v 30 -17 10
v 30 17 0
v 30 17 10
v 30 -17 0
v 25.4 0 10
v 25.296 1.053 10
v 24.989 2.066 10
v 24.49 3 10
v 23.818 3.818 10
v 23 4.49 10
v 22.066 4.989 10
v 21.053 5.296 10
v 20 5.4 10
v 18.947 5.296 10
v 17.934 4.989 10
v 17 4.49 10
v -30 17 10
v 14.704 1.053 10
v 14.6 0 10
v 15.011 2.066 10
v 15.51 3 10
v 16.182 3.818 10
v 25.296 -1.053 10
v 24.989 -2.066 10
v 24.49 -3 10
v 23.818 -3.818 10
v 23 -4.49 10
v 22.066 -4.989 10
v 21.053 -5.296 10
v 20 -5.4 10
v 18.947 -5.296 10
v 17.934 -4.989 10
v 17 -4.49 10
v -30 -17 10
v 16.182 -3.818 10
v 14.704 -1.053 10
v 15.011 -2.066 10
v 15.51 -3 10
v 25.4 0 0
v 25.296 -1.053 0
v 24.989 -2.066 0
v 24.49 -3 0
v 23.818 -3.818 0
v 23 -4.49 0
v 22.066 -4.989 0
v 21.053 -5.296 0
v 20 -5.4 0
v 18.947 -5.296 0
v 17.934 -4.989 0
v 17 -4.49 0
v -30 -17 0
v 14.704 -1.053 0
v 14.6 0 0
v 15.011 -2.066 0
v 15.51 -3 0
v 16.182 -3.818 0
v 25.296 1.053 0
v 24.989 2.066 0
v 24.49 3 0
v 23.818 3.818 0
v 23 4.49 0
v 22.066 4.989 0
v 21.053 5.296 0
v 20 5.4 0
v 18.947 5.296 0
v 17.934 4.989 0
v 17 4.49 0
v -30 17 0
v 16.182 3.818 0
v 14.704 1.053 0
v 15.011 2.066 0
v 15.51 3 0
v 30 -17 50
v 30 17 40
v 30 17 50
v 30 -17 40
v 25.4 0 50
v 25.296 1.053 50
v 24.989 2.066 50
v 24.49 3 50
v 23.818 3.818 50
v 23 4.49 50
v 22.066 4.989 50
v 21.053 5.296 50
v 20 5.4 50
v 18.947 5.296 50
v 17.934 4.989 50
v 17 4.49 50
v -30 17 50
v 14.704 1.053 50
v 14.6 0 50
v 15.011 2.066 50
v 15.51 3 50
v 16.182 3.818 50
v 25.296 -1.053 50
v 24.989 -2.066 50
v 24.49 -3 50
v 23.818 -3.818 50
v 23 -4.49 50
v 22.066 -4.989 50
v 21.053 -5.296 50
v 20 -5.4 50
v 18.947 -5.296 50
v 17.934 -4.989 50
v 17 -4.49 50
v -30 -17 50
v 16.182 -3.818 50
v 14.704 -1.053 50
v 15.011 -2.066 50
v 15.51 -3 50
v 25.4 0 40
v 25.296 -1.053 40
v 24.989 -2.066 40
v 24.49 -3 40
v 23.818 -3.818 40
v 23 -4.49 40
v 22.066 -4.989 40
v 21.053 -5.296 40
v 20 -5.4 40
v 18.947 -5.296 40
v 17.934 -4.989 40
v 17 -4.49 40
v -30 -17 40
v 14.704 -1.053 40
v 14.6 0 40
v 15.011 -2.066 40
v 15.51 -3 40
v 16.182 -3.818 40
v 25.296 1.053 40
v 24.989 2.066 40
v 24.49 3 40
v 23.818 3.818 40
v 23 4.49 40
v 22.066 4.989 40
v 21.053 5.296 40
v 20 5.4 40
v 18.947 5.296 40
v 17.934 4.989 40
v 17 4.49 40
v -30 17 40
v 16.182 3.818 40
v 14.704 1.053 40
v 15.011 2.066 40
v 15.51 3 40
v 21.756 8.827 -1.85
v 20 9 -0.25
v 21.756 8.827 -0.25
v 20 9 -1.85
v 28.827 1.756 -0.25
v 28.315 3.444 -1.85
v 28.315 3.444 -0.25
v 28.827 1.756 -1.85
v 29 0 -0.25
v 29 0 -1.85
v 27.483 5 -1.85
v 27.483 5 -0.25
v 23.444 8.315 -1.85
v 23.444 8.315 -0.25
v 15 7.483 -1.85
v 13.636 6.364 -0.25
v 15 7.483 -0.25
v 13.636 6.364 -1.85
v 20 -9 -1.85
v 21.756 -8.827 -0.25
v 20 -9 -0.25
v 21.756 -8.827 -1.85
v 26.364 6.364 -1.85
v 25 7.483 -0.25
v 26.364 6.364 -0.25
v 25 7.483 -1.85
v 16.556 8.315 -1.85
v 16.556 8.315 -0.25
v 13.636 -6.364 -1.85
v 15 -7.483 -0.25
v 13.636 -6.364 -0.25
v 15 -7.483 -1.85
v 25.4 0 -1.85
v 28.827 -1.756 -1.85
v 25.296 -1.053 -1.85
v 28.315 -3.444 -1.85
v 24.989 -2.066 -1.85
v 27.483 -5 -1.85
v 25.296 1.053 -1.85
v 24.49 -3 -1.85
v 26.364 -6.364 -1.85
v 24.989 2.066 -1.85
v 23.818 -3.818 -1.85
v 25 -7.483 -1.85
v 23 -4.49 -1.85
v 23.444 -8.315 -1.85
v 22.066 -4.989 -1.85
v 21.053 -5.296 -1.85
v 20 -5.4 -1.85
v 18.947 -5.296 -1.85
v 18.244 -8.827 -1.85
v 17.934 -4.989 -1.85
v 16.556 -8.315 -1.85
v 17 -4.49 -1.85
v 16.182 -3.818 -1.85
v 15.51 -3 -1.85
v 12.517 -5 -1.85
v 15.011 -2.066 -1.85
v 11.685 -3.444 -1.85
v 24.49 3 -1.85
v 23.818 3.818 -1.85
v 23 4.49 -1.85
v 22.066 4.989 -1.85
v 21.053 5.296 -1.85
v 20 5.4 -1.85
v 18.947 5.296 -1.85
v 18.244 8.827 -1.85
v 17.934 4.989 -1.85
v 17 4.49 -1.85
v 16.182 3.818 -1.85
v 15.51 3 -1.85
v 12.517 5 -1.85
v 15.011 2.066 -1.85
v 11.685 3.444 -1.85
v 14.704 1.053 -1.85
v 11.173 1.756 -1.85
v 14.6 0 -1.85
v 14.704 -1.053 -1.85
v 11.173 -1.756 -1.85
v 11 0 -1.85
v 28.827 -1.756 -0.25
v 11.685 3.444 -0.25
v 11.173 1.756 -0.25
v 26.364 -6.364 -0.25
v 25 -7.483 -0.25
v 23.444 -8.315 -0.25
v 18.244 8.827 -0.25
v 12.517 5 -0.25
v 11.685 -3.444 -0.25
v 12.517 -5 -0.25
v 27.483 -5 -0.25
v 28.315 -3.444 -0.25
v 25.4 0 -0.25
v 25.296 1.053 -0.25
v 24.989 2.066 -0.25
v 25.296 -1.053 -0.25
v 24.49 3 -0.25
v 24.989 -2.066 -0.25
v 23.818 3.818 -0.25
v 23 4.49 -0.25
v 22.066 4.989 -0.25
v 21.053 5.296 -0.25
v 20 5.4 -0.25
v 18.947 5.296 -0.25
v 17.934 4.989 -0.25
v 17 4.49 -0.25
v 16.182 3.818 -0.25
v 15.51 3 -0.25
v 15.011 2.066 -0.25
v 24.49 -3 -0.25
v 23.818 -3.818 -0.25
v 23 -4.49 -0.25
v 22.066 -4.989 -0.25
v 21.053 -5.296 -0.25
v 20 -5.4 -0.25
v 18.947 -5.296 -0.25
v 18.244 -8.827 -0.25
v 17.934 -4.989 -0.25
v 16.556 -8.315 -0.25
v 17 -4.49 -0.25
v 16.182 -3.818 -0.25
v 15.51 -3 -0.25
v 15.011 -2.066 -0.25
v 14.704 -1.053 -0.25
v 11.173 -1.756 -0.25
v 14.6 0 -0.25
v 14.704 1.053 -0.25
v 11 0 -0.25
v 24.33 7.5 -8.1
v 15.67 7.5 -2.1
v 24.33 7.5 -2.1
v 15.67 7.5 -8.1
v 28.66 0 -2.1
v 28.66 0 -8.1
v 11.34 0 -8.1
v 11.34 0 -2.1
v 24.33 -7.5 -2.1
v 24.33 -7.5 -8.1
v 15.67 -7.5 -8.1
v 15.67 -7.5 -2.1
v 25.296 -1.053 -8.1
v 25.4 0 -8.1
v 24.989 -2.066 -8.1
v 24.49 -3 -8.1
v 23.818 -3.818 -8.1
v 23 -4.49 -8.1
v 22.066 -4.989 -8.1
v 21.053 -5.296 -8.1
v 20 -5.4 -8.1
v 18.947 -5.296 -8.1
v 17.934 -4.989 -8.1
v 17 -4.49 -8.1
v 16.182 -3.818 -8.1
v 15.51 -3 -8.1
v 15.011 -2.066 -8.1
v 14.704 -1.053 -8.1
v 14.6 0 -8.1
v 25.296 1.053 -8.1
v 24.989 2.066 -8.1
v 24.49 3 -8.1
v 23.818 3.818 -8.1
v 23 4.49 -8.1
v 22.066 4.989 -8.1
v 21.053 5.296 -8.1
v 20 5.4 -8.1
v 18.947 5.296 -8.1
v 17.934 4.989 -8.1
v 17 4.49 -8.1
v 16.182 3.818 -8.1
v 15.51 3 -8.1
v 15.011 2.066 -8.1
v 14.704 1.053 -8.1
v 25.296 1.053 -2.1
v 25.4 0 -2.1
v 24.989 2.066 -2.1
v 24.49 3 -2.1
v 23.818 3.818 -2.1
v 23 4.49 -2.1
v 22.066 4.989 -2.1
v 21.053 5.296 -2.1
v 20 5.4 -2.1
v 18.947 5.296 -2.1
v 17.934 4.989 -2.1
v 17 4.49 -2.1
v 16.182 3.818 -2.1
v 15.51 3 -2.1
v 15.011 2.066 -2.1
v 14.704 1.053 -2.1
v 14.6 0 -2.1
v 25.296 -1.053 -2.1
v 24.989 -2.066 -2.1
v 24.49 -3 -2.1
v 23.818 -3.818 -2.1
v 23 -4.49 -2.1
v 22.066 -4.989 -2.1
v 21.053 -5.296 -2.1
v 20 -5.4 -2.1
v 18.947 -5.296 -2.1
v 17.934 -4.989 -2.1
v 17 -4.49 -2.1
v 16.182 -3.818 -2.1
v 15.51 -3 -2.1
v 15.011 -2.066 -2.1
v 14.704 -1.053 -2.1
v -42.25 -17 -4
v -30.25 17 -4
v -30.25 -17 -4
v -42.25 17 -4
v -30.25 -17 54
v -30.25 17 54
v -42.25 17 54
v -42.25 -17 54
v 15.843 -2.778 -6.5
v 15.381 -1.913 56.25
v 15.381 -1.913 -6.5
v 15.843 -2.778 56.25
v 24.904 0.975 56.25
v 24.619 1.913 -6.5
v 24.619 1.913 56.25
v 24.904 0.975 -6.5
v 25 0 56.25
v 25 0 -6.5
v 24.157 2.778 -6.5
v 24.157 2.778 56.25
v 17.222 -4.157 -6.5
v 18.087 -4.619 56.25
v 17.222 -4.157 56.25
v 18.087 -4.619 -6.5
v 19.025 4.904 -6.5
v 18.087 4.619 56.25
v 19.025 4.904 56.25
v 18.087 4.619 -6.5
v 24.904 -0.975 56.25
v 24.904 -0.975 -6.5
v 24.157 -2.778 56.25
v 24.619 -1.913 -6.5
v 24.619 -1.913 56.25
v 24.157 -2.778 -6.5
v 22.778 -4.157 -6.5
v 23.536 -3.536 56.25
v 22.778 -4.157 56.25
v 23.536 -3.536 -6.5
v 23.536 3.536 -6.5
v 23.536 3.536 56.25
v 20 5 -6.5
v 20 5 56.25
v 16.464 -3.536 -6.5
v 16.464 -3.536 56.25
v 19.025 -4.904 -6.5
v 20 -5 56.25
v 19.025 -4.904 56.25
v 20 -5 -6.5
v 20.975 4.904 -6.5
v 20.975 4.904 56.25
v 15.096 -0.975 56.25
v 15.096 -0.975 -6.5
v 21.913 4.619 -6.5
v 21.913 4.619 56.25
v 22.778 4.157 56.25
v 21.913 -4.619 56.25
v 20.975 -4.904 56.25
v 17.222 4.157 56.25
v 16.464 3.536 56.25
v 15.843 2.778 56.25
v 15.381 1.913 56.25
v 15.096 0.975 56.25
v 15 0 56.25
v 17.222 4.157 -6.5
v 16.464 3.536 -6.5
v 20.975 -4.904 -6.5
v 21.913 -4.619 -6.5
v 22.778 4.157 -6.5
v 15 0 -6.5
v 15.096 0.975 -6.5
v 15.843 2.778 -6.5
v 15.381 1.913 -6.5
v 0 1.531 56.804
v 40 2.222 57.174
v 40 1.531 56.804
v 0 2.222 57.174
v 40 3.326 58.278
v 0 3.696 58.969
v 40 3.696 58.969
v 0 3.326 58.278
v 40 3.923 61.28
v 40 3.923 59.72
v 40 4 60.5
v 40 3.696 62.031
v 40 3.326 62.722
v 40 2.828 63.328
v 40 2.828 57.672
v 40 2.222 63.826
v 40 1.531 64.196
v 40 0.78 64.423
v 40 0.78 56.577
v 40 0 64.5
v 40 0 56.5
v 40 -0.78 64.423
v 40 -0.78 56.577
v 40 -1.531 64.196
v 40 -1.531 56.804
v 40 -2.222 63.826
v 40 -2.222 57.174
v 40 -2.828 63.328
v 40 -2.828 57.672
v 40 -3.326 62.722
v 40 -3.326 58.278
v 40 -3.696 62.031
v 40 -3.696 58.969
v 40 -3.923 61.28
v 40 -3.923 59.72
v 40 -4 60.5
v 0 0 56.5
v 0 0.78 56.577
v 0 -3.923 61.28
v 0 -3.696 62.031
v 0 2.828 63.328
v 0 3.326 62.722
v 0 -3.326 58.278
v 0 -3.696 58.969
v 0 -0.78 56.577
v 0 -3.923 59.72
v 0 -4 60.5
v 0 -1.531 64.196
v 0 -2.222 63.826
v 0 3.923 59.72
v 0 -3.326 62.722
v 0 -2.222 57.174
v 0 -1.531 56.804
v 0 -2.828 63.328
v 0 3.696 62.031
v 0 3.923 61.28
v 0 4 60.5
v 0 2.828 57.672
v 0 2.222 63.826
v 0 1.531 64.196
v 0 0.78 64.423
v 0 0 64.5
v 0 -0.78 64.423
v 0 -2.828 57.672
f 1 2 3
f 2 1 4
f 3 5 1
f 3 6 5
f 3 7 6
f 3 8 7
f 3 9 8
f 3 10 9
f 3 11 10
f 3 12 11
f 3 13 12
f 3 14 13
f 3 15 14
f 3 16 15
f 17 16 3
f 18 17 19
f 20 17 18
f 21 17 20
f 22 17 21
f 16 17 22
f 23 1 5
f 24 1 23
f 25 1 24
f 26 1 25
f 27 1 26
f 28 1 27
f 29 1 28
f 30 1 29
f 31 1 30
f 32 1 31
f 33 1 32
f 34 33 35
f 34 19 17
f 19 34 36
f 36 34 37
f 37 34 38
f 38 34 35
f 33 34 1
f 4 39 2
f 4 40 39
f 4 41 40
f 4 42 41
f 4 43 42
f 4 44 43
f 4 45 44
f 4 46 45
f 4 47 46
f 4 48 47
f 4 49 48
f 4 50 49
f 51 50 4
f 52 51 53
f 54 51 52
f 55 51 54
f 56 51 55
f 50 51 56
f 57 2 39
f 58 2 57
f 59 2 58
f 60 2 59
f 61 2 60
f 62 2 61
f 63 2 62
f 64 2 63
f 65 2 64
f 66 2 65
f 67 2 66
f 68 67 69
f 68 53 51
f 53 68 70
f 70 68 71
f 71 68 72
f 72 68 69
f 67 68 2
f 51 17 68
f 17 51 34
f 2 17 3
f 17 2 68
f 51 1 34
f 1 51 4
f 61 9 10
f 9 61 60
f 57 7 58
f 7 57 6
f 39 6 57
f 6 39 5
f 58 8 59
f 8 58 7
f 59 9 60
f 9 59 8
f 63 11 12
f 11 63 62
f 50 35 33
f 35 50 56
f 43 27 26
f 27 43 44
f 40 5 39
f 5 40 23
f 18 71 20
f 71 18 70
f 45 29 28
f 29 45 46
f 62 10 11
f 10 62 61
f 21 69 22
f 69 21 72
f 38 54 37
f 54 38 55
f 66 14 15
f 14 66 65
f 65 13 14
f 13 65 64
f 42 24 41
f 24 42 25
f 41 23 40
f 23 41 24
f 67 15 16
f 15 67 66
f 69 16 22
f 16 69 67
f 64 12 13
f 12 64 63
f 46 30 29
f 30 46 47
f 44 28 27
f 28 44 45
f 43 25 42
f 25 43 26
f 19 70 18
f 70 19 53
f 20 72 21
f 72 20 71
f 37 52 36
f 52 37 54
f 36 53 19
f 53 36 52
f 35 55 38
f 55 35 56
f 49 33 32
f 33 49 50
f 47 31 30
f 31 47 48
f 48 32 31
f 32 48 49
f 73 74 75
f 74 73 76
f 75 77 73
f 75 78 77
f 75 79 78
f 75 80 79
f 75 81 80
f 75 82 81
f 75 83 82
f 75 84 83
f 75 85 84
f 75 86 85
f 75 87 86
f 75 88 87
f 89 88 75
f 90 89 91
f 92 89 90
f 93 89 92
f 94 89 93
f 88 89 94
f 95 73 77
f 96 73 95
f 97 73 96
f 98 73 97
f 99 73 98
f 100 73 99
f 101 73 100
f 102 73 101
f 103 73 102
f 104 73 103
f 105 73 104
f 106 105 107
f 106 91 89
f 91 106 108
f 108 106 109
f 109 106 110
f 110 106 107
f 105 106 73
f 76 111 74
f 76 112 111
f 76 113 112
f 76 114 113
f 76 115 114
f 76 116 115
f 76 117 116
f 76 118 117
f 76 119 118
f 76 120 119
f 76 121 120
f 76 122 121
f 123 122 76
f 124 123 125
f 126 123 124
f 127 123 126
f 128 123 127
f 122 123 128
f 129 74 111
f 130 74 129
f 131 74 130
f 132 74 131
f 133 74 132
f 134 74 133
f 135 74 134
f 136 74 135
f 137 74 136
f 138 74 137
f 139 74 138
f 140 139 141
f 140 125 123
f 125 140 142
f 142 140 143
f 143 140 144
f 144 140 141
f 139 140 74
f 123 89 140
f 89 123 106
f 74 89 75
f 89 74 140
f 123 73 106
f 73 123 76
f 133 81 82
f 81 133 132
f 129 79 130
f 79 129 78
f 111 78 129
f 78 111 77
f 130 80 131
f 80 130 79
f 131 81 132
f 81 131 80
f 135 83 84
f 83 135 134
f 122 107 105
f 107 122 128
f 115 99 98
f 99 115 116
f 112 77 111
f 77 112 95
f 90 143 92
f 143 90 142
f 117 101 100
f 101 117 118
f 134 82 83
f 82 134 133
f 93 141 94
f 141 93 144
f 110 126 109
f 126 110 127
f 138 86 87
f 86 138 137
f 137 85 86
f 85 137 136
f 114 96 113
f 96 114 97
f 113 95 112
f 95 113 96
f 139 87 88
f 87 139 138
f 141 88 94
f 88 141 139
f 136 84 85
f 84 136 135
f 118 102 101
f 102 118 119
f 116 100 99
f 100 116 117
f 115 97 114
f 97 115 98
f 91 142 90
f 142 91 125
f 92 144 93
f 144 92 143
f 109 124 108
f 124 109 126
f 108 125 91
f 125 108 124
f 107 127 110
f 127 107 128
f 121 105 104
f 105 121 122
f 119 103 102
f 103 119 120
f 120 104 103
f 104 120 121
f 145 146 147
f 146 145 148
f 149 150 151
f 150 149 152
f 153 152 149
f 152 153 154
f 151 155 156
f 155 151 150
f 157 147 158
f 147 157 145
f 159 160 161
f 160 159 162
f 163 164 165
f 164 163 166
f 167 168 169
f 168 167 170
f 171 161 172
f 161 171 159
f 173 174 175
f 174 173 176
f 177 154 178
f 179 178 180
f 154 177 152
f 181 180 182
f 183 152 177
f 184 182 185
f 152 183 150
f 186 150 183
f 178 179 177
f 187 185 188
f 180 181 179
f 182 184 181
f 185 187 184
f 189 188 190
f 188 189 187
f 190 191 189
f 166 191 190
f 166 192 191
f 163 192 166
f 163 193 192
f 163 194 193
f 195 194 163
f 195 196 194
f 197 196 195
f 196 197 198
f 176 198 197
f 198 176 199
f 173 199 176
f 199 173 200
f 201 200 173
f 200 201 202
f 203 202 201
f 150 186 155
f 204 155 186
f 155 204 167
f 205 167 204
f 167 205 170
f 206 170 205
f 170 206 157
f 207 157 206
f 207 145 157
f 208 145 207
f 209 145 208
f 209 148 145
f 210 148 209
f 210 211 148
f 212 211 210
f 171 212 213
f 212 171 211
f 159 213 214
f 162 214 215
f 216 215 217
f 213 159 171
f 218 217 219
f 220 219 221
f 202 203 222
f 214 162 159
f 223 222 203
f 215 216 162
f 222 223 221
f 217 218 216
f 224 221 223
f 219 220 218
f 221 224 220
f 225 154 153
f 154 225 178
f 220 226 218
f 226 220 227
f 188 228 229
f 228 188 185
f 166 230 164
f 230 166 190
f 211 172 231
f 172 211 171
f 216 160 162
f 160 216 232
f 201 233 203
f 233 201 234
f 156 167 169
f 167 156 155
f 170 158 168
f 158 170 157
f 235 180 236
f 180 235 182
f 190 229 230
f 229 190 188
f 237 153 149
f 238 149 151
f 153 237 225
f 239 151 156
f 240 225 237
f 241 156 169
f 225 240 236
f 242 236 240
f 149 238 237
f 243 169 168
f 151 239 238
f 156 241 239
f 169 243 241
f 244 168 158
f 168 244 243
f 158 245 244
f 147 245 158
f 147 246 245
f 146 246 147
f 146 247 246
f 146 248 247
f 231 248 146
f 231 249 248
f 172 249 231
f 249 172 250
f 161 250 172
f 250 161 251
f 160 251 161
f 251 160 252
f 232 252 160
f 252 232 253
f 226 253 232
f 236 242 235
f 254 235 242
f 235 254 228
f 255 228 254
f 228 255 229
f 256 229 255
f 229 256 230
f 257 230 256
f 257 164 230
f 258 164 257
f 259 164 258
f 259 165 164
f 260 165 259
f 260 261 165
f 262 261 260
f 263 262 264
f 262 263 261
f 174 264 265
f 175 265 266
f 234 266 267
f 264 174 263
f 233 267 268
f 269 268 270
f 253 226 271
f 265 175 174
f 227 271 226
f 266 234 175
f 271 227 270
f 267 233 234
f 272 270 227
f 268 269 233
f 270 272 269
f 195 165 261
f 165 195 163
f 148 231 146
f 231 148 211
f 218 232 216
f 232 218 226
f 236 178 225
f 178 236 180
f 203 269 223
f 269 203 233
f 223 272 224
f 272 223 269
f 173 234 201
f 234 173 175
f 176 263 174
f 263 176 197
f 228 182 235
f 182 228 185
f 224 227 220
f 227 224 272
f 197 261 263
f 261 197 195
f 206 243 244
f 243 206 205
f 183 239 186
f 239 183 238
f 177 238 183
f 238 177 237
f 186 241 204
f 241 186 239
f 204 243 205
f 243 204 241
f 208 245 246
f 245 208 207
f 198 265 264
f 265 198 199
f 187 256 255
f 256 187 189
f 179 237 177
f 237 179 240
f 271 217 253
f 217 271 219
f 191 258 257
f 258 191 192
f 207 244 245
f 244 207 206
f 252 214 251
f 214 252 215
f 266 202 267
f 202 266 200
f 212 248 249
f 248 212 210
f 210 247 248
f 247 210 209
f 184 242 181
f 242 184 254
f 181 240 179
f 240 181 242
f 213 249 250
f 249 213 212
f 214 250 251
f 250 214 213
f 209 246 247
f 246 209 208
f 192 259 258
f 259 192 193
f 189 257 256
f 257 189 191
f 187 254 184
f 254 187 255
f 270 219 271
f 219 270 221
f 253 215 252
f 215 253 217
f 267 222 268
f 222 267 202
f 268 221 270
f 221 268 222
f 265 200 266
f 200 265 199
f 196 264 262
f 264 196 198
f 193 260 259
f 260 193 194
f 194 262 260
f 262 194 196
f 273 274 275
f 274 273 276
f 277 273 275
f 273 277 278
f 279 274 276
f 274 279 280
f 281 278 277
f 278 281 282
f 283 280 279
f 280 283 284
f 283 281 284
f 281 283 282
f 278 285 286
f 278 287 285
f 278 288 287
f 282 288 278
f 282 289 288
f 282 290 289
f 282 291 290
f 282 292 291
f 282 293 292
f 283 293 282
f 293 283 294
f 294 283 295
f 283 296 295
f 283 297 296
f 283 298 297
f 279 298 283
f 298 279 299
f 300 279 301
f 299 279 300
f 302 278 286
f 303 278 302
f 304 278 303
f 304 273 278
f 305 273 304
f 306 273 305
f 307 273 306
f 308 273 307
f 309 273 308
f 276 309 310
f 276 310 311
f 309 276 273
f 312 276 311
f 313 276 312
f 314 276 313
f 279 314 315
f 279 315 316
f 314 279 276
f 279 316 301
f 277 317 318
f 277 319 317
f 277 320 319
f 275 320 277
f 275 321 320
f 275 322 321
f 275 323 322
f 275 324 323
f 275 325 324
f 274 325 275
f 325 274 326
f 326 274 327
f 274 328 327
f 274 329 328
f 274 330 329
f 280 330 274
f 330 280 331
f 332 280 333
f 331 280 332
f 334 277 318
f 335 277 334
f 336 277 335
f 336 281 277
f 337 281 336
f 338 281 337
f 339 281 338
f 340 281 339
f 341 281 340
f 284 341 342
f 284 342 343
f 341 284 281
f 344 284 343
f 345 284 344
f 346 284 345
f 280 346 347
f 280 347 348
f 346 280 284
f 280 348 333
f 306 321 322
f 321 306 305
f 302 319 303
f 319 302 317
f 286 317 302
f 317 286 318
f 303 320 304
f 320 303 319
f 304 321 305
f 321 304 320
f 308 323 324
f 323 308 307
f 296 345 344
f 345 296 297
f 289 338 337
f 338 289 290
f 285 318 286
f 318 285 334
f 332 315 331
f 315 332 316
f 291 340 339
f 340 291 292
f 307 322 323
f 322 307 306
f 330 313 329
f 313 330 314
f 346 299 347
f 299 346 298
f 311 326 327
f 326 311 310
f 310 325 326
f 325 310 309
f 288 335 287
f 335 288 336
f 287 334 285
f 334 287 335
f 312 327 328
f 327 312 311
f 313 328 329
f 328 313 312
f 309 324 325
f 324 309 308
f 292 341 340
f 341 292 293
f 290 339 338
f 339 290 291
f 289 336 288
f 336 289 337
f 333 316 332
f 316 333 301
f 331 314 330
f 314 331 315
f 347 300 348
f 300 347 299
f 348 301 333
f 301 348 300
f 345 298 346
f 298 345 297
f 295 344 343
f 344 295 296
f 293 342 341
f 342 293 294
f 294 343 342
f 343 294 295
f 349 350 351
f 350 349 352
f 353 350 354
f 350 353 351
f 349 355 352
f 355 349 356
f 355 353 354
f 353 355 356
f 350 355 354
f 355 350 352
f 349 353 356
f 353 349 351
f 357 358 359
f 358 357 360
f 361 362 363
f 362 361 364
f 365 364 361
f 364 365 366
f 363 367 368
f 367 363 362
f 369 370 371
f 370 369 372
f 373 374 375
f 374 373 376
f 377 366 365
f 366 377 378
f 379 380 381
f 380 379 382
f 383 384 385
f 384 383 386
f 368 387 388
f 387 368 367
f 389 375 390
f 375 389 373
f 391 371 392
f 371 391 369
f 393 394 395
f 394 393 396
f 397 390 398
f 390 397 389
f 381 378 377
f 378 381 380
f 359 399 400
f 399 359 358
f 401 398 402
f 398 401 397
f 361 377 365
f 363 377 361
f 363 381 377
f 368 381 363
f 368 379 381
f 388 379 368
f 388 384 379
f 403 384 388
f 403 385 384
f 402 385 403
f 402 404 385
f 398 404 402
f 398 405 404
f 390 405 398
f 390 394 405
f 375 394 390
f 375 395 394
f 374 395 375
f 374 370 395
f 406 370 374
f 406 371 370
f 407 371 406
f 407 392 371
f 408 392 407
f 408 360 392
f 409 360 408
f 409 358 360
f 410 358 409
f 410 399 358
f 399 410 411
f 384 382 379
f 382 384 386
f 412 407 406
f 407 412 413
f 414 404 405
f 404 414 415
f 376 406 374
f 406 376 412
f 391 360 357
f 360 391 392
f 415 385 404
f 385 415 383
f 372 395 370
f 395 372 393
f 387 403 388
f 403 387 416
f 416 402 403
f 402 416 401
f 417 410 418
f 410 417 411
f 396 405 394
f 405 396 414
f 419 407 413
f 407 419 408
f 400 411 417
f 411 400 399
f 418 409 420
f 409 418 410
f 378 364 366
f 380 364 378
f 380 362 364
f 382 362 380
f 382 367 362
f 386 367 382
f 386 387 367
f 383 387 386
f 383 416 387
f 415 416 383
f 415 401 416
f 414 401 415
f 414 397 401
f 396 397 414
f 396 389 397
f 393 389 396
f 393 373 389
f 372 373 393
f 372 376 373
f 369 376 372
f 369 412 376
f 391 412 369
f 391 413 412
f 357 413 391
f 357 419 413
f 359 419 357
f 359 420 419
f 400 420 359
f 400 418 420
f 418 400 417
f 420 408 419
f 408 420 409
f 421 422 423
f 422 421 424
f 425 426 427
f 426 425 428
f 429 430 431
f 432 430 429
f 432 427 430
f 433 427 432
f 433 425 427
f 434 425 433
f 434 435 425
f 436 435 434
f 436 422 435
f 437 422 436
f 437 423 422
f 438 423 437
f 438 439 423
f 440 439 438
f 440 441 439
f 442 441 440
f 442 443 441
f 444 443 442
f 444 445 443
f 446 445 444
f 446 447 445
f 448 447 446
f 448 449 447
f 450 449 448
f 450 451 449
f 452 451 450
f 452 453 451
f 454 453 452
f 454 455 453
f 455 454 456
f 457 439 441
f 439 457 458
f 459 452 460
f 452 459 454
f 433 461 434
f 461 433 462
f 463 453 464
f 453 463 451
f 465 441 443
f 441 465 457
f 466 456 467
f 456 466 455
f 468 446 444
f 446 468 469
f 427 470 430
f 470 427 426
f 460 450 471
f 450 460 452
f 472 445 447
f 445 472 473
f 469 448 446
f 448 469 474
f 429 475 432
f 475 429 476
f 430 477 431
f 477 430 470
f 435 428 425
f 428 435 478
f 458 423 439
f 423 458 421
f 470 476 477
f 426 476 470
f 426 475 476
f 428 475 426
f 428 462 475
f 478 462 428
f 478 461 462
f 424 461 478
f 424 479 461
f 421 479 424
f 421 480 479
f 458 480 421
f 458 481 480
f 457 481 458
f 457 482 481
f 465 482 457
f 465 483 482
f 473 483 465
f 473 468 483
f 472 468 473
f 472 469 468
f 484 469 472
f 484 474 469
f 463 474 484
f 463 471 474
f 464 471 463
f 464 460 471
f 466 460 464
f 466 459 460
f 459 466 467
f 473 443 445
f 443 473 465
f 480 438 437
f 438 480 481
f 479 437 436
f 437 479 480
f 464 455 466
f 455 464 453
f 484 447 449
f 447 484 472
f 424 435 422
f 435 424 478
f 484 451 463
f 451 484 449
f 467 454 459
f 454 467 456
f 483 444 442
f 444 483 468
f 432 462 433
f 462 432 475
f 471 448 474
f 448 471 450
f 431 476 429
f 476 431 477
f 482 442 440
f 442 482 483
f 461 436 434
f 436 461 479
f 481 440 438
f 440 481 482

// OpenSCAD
$fn = 32;

// ------------------------------------------------------------------------
// C clamp: throat 40 mm, screw d10
// Every part is its own module, assembly() places every instance.
// ------------------------------------------------------------------------

// --- part 1 ---
module clamp_arm() {
  difference() {
    translate([-30, -17, 0]) cube([60, 34, 10]);
    translate([20, 0, -1]) cylinder(h = 12, d = 10.8);
  }
}

// --- part 2 ---
module clamp_spine() {
  difference() {
    translate([-29, -17, 0]) cube([58, 34, 12]);
  }
}

// --- part 3 ---
module clamp_screw() {
  translate([0, 0, -31.375]) cylinder(h = 62.75, d = 10);
}

// --- part 4 ---
module clamp_washer() {
  difference() {
      translate([0, 0, 0]) cylinder(h = 1.6, d = 18);
      translate([0, 0, -1]) cylinder(h = 3.6, d = 10.8);
    }
}

// --- part 5 ---
module clamp_nut() {
  difference() {
    linear_extrude(height = 6) polygon(points = [[8.66, 0], [4.33, 7.5], [-4.33, 7.5], [-8.66, 0], [-4.33, -7.5], [4.33, -7.5]]);
    translate([0, 0, -1]) cylinder(h = 8, d = 10.8);
  }
}

// --- part 6 ---
module tommy_bar() {
  translate([0, 0, -20]) cylinder(h = 40, d = 8);
}

// --- assembly ---
module assembly() {
  color([0.80, 0.24, 0.20]) translate([0, 0, 0]) rotate([0, 0, 0]) clamp_arm();
  color([0.20, 0.45, 0.75]) translate([0, 0, 40]) rotate([0, 0, 0]) clamp_arm();
  color([0.25, 0.62, 0.32]) translate([-42.25, 0, 25]) rotate([0, 90, 0]) clamp_spine();
  color([0.92, 0.70, 0.18]) translate([20, 0, 24.875]) rotate([0, 0, 0]) clamp_screw();
  color([0.58, 0.35, 0.70]) translate([20, 0, -1.85]) rotate([0, 0, 0]) clamp_washer();
  color([0.16, 0.66, 0.66]) translate([20, 0, -8.1]) rotate([0, 0, 0]) clamp_nut();
  color([0.85, 0.48, 0.18]) translate([20, 0, 60.5]) rotate([0, 90, 0]) tommy_bar();
}

assembly();
